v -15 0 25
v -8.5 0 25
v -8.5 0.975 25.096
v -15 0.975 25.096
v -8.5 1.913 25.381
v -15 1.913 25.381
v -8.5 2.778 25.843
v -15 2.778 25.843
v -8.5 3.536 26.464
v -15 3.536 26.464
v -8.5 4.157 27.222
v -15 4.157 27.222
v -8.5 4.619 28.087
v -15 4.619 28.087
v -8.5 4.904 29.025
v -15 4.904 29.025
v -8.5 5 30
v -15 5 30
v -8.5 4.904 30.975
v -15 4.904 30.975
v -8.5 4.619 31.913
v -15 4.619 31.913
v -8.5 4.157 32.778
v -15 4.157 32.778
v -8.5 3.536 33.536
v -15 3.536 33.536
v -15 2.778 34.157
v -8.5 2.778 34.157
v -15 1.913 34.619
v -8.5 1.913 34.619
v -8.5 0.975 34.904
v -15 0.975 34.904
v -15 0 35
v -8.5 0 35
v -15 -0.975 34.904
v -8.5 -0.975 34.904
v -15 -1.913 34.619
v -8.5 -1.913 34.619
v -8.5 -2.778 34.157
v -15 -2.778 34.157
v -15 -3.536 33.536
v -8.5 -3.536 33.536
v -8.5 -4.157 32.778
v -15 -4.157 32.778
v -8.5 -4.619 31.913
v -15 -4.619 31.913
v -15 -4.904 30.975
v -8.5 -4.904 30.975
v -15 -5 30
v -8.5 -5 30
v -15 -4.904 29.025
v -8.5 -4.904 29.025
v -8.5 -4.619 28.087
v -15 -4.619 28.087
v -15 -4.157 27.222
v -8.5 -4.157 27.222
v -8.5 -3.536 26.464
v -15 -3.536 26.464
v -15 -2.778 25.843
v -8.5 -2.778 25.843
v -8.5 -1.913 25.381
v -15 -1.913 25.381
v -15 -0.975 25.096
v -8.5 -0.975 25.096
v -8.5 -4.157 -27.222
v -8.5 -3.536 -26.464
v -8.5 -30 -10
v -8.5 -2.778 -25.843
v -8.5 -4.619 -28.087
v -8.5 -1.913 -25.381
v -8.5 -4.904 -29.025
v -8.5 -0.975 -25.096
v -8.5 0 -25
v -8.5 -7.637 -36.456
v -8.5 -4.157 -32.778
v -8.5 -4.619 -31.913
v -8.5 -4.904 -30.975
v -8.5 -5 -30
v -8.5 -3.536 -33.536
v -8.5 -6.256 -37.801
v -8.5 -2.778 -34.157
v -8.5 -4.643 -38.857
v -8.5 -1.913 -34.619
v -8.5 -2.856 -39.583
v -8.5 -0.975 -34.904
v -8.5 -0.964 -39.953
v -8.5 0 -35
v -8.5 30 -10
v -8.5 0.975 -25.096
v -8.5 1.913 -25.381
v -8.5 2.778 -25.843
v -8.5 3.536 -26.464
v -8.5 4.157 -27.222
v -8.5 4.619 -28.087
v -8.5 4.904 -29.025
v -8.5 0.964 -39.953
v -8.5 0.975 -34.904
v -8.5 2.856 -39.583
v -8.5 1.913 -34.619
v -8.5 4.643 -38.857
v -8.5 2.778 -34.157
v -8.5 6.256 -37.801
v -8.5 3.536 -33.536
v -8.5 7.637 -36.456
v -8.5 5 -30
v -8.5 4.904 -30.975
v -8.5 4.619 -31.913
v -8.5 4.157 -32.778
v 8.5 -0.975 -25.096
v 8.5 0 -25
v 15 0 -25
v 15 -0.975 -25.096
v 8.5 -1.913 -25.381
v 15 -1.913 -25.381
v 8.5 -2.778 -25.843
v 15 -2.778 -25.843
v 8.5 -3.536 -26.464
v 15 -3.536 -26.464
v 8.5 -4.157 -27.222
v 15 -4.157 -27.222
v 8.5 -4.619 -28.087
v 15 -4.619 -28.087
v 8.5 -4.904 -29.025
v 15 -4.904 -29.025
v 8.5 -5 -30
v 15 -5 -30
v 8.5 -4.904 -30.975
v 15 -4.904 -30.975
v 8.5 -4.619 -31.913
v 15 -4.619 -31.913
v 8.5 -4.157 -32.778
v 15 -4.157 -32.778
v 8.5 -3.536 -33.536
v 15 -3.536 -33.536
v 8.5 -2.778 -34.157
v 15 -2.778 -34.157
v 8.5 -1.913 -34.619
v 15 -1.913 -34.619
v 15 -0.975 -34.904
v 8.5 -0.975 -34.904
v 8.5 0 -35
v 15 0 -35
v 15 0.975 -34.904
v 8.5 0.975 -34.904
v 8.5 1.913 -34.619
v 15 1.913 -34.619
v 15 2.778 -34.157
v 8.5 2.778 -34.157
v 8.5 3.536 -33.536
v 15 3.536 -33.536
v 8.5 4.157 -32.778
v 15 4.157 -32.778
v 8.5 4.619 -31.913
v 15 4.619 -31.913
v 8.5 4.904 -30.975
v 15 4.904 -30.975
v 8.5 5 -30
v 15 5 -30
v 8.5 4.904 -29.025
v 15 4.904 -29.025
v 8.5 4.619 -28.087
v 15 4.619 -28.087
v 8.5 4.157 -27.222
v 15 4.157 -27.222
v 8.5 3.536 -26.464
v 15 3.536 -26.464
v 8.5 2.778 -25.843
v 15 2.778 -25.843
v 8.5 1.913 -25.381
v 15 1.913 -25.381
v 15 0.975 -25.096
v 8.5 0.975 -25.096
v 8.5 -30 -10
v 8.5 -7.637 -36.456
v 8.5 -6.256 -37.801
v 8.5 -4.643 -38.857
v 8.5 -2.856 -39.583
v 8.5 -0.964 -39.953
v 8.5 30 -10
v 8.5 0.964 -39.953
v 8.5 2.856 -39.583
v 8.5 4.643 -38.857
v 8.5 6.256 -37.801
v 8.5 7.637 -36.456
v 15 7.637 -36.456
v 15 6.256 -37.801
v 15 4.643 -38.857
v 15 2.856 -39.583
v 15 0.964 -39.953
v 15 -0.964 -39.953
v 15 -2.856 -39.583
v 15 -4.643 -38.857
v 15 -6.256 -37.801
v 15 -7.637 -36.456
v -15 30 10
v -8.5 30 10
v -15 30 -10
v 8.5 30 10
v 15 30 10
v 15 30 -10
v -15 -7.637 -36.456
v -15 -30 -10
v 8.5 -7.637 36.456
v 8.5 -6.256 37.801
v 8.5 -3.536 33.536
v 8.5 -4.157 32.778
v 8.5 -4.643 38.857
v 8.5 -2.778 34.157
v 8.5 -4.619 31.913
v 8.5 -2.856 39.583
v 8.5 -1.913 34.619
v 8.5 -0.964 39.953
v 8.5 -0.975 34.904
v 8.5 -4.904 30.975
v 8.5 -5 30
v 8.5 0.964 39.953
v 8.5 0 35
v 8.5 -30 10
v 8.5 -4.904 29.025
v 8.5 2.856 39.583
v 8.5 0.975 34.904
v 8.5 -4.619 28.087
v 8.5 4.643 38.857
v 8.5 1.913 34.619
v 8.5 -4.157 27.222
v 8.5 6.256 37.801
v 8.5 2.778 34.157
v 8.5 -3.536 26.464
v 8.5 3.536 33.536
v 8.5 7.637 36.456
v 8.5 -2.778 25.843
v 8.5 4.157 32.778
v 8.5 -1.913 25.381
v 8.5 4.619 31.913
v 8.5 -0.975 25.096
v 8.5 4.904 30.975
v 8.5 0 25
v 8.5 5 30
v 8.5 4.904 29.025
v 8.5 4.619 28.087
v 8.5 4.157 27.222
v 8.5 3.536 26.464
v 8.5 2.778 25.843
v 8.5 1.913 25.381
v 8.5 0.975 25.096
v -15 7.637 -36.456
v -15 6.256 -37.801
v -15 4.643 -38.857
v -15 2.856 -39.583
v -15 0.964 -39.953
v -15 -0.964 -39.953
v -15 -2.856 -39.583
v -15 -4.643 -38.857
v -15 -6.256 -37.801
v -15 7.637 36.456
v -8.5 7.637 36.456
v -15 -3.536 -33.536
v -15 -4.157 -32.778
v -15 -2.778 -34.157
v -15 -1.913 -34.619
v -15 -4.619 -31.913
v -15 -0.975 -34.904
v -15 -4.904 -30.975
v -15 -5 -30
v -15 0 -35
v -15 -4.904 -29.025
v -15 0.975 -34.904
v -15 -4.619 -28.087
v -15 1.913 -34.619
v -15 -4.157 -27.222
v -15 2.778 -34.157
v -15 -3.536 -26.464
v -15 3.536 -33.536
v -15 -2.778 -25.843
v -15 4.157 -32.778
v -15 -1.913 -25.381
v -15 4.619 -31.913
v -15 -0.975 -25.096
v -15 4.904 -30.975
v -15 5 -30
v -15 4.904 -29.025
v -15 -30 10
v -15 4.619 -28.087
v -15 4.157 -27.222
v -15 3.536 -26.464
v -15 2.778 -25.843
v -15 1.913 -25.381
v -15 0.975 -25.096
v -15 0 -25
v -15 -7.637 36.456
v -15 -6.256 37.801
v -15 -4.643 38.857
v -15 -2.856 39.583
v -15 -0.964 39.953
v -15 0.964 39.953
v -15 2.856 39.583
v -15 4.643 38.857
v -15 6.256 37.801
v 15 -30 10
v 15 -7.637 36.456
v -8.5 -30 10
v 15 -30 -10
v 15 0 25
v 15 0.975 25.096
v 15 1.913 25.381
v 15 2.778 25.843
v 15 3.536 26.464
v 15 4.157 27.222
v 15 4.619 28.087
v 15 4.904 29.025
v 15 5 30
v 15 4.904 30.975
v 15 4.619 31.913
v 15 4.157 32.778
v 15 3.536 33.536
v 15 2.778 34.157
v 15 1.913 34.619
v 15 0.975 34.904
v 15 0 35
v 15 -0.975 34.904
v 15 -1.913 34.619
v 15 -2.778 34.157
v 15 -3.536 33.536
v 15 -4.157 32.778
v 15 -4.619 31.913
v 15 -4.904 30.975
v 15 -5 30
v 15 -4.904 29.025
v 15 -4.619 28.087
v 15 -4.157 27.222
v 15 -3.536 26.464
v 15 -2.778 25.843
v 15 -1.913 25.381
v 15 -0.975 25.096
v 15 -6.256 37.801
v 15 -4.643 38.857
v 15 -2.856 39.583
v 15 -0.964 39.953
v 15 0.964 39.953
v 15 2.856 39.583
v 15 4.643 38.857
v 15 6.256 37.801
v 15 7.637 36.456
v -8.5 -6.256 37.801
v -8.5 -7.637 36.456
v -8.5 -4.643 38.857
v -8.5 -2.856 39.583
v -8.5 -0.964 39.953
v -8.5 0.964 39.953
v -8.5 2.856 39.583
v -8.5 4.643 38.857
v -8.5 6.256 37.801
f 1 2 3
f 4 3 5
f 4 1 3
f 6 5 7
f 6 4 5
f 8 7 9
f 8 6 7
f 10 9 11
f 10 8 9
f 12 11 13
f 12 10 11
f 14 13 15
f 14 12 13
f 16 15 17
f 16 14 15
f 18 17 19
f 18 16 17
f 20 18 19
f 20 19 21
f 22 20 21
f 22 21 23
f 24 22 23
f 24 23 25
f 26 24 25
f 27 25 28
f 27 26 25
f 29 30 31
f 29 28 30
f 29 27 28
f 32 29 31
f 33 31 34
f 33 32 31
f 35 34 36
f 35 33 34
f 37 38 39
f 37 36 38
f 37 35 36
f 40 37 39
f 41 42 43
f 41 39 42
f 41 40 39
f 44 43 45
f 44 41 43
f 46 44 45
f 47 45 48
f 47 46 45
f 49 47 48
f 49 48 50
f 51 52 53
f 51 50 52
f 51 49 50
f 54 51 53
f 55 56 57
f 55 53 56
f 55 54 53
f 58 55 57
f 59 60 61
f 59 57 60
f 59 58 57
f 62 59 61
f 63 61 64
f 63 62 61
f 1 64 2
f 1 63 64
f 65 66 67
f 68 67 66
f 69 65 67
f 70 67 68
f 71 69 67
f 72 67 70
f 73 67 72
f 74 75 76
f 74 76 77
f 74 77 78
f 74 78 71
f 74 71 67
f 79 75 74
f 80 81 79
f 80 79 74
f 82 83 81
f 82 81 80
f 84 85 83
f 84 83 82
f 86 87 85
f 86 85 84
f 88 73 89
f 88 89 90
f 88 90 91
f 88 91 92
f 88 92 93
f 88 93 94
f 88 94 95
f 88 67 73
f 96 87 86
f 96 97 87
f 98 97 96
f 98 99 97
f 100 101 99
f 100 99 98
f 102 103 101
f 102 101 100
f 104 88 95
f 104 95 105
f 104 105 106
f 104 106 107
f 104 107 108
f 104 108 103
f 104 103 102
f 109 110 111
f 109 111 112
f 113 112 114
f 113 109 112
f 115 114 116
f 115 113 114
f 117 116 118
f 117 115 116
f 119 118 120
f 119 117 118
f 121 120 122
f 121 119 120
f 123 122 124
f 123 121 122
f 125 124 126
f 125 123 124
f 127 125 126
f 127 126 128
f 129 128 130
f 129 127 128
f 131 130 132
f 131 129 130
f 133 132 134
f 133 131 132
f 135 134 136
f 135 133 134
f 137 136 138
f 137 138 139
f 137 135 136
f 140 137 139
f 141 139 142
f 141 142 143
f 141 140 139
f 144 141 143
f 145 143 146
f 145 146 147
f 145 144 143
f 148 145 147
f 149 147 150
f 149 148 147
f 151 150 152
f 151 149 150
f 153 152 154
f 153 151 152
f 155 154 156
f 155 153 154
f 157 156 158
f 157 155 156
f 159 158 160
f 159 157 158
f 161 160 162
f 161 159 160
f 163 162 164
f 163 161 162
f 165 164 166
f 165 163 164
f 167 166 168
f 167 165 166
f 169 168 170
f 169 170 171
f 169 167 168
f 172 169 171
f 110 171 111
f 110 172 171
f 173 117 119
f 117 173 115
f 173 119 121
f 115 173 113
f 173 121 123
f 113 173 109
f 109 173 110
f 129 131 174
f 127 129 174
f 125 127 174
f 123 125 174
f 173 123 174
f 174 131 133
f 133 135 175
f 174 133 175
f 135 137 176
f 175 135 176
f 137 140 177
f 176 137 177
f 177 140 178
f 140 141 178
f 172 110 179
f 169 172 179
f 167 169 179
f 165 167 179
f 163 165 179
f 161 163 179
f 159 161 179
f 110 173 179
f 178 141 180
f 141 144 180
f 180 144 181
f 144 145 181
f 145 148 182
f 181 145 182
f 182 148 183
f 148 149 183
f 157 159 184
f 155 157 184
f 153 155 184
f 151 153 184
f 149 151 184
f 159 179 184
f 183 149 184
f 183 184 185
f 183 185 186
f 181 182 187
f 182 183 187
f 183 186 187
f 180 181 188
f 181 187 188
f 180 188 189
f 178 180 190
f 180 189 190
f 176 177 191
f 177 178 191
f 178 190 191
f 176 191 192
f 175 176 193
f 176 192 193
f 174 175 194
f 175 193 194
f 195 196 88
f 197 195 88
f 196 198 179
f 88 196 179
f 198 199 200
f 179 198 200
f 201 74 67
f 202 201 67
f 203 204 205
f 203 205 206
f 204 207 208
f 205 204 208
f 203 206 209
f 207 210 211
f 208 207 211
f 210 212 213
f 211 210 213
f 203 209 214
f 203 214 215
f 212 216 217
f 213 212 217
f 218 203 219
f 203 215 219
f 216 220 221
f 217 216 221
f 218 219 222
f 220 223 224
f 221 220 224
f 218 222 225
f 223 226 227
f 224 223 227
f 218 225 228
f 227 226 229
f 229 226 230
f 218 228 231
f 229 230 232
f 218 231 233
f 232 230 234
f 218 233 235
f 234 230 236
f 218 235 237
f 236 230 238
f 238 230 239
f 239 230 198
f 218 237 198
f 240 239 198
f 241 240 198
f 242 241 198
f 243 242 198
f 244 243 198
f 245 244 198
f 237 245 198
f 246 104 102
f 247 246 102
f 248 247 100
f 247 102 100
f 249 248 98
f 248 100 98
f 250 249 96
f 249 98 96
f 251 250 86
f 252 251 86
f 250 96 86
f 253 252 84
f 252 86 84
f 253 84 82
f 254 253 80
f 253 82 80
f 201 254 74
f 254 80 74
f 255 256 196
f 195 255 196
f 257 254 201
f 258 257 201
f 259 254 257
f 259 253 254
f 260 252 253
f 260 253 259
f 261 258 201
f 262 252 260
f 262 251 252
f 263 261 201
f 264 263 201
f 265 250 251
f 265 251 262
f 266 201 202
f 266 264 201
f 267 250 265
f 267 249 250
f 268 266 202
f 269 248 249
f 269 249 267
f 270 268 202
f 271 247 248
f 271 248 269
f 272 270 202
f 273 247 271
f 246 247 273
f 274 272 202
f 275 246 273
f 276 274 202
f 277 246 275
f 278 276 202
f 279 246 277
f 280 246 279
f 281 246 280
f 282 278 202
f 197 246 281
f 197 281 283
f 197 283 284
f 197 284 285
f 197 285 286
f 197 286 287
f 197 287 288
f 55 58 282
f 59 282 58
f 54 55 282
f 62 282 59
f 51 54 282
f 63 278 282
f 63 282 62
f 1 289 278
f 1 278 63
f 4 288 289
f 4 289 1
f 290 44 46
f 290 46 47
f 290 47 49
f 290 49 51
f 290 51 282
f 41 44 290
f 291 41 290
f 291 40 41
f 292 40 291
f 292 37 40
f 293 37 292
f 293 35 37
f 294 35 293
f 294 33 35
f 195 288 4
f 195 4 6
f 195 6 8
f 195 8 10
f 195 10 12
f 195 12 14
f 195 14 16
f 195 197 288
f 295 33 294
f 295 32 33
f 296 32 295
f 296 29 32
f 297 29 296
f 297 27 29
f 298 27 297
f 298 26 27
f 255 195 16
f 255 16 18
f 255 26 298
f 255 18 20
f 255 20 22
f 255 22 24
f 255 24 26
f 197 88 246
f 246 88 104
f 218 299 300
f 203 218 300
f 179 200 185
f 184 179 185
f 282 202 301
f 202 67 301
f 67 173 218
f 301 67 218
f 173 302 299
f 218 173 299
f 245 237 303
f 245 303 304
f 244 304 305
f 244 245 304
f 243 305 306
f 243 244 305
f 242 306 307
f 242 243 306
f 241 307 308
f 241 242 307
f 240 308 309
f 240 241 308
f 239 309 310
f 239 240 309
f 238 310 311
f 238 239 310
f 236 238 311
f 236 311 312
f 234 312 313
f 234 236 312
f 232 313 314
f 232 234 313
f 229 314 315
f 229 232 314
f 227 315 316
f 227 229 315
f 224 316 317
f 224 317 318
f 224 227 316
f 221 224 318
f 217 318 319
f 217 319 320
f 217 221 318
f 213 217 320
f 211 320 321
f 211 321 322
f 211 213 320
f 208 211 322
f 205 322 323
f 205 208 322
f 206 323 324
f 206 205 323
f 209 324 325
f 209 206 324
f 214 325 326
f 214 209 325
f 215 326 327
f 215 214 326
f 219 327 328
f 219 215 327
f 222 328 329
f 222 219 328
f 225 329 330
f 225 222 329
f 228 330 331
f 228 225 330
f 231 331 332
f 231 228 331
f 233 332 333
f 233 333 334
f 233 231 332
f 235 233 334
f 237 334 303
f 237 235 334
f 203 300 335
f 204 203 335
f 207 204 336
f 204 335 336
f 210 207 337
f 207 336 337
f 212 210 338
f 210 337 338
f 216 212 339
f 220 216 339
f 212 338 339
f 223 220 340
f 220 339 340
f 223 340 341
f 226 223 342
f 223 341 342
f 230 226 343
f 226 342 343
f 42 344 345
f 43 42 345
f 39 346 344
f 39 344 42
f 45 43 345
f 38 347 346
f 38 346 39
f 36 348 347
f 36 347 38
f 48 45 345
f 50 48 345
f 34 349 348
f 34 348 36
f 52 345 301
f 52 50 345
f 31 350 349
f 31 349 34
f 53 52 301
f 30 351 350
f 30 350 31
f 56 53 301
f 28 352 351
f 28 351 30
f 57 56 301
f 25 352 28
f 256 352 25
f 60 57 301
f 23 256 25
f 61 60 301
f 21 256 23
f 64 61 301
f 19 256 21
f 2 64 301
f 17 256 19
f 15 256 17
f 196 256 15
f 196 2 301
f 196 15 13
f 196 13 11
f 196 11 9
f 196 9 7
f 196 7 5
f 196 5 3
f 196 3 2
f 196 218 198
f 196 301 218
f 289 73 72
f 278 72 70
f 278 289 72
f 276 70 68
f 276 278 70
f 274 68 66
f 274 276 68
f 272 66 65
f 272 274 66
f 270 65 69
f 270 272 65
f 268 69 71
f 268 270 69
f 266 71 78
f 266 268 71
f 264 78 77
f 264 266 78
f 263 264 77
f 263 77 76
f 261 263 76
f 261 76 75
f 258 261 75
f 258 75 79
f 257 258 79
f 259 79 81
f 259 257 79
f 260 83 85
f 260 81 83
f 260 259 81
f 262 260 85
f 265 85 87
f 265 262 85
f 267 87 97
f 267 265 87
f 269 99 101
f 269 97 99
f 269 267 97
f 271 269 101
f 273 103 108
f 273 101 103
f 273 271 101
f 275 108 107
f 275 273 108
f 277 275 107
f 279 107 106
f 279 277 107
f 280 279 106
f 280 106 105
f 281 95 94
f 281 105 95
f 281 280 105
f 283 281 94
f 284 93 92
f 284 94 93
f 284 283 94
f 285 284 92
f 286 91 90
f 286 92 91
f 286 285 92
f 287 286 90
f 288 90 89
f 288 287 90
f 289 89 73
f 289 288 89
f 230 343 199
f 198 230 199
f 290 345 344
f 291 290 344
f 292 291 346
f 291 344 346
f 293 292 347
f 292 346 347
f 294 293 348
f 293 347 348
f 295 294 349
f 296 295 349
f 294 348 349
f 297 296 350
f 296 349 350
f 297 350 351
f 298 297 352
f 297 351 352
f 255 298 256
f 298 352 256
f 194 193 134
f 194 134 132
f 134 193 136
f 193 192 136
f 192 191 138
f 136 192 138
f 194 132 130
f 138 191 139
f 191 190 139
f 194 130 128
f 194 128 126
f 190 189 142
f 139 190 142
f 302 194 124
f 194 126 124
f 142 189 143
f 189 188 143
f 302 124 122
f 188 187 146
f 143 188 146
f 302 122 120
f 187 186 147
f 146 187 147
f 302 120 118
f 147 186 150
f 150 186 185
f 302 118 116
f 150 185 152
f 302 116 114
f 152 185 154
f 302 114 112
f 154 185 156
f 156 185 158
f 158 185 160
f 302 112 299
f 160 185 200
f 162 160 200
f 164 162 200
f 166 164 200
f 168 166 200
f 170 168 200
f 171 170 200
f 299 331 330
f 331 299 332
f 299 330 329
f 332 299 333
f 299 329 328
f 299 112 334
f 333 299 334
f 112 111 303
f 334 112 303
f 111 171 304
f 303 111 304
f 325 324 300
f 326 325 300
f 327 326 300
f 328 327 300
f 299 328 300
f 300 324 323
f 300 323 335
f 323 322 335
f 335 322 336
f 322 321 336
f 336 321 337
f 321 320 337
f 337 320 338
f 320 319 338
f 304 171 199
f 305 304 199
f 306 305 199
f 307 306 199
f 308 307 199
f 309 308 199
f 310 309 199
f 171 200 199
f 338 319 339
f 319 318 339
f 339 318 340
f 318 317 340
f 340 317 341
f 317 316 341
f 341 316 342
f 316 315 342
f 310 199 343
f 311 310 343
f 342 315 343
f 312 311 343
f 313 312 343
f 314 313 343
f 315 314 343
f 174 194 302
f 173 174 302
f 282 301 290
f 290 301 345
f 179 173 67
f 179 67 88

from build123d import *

# Parameters (mm, degrees)
SKETCH1_R           = 5
BOSS_EXTRUDE1_DEPTH = 15
SKETCH3_W           = 30
SKETCH3_H           = 60
CUT_EXTRUDE2_DEPTH  = 8.5


with BuildPart() as part:
    # Sketch1 → Boss-Extrude1 (new, symmetric)
    with BuildSketch(Plane(origin=(0, 0, 0), x_dir=(0, 0, -1), z_dir=(1, 0, 0))):
        with BuildLine():
            Line((-10, 30), (10, 30))
            Line((10, 30), (36.455619112, 7.637079408))
            ThreePointArc((36.455619112, 7.637079408), (40, 0), (36.455619112, -7.637079408))
            Line((36.455619112, -7.637079408), (10, -30))
            Line((10, -30), (-10, -30))
            Line((-10, -30), (-36.455619112, -7.637079408))
            ThreePointArc((-36.455619112, -7.637079408), (-40, 0), (-36.455619112, 7.637079408))
            Line((-36.455619112, 7.637079408), (-10, 30))
        make_face()
        with Locations((-30, 0)):
            Circle(SKETCH1_R, mode=Mode.SUBTRACT)
        with Locations(Location((30, 0, 0), (0, 0, 180))):
            Circle(SKETCH1_R, mode=Mode.SUBTRACT)
    extrude(amount=BOSS_EXTRUDE1_DEPTH, both=True)

    # Sketch3 → Cut-Extrude2 (cut, symmetric)
    with BuildSketch(Plane(origin=(0, 0, 0), x_dir=(0, 0, -1), z_dir=(1, 0, 0))):
        with Locations((-25, 0)):
            Rectangle(SKETCH3_W, SKETCH3_H)
        with Locations((25, 0)):
            Rectangle(SKETCH3_W, SKETCH3_H)
    extrude(amount=CUT_EXTRUDE2_DEPTH, both=True, mode=Mode.SUBTRACT)


solid = part.part
